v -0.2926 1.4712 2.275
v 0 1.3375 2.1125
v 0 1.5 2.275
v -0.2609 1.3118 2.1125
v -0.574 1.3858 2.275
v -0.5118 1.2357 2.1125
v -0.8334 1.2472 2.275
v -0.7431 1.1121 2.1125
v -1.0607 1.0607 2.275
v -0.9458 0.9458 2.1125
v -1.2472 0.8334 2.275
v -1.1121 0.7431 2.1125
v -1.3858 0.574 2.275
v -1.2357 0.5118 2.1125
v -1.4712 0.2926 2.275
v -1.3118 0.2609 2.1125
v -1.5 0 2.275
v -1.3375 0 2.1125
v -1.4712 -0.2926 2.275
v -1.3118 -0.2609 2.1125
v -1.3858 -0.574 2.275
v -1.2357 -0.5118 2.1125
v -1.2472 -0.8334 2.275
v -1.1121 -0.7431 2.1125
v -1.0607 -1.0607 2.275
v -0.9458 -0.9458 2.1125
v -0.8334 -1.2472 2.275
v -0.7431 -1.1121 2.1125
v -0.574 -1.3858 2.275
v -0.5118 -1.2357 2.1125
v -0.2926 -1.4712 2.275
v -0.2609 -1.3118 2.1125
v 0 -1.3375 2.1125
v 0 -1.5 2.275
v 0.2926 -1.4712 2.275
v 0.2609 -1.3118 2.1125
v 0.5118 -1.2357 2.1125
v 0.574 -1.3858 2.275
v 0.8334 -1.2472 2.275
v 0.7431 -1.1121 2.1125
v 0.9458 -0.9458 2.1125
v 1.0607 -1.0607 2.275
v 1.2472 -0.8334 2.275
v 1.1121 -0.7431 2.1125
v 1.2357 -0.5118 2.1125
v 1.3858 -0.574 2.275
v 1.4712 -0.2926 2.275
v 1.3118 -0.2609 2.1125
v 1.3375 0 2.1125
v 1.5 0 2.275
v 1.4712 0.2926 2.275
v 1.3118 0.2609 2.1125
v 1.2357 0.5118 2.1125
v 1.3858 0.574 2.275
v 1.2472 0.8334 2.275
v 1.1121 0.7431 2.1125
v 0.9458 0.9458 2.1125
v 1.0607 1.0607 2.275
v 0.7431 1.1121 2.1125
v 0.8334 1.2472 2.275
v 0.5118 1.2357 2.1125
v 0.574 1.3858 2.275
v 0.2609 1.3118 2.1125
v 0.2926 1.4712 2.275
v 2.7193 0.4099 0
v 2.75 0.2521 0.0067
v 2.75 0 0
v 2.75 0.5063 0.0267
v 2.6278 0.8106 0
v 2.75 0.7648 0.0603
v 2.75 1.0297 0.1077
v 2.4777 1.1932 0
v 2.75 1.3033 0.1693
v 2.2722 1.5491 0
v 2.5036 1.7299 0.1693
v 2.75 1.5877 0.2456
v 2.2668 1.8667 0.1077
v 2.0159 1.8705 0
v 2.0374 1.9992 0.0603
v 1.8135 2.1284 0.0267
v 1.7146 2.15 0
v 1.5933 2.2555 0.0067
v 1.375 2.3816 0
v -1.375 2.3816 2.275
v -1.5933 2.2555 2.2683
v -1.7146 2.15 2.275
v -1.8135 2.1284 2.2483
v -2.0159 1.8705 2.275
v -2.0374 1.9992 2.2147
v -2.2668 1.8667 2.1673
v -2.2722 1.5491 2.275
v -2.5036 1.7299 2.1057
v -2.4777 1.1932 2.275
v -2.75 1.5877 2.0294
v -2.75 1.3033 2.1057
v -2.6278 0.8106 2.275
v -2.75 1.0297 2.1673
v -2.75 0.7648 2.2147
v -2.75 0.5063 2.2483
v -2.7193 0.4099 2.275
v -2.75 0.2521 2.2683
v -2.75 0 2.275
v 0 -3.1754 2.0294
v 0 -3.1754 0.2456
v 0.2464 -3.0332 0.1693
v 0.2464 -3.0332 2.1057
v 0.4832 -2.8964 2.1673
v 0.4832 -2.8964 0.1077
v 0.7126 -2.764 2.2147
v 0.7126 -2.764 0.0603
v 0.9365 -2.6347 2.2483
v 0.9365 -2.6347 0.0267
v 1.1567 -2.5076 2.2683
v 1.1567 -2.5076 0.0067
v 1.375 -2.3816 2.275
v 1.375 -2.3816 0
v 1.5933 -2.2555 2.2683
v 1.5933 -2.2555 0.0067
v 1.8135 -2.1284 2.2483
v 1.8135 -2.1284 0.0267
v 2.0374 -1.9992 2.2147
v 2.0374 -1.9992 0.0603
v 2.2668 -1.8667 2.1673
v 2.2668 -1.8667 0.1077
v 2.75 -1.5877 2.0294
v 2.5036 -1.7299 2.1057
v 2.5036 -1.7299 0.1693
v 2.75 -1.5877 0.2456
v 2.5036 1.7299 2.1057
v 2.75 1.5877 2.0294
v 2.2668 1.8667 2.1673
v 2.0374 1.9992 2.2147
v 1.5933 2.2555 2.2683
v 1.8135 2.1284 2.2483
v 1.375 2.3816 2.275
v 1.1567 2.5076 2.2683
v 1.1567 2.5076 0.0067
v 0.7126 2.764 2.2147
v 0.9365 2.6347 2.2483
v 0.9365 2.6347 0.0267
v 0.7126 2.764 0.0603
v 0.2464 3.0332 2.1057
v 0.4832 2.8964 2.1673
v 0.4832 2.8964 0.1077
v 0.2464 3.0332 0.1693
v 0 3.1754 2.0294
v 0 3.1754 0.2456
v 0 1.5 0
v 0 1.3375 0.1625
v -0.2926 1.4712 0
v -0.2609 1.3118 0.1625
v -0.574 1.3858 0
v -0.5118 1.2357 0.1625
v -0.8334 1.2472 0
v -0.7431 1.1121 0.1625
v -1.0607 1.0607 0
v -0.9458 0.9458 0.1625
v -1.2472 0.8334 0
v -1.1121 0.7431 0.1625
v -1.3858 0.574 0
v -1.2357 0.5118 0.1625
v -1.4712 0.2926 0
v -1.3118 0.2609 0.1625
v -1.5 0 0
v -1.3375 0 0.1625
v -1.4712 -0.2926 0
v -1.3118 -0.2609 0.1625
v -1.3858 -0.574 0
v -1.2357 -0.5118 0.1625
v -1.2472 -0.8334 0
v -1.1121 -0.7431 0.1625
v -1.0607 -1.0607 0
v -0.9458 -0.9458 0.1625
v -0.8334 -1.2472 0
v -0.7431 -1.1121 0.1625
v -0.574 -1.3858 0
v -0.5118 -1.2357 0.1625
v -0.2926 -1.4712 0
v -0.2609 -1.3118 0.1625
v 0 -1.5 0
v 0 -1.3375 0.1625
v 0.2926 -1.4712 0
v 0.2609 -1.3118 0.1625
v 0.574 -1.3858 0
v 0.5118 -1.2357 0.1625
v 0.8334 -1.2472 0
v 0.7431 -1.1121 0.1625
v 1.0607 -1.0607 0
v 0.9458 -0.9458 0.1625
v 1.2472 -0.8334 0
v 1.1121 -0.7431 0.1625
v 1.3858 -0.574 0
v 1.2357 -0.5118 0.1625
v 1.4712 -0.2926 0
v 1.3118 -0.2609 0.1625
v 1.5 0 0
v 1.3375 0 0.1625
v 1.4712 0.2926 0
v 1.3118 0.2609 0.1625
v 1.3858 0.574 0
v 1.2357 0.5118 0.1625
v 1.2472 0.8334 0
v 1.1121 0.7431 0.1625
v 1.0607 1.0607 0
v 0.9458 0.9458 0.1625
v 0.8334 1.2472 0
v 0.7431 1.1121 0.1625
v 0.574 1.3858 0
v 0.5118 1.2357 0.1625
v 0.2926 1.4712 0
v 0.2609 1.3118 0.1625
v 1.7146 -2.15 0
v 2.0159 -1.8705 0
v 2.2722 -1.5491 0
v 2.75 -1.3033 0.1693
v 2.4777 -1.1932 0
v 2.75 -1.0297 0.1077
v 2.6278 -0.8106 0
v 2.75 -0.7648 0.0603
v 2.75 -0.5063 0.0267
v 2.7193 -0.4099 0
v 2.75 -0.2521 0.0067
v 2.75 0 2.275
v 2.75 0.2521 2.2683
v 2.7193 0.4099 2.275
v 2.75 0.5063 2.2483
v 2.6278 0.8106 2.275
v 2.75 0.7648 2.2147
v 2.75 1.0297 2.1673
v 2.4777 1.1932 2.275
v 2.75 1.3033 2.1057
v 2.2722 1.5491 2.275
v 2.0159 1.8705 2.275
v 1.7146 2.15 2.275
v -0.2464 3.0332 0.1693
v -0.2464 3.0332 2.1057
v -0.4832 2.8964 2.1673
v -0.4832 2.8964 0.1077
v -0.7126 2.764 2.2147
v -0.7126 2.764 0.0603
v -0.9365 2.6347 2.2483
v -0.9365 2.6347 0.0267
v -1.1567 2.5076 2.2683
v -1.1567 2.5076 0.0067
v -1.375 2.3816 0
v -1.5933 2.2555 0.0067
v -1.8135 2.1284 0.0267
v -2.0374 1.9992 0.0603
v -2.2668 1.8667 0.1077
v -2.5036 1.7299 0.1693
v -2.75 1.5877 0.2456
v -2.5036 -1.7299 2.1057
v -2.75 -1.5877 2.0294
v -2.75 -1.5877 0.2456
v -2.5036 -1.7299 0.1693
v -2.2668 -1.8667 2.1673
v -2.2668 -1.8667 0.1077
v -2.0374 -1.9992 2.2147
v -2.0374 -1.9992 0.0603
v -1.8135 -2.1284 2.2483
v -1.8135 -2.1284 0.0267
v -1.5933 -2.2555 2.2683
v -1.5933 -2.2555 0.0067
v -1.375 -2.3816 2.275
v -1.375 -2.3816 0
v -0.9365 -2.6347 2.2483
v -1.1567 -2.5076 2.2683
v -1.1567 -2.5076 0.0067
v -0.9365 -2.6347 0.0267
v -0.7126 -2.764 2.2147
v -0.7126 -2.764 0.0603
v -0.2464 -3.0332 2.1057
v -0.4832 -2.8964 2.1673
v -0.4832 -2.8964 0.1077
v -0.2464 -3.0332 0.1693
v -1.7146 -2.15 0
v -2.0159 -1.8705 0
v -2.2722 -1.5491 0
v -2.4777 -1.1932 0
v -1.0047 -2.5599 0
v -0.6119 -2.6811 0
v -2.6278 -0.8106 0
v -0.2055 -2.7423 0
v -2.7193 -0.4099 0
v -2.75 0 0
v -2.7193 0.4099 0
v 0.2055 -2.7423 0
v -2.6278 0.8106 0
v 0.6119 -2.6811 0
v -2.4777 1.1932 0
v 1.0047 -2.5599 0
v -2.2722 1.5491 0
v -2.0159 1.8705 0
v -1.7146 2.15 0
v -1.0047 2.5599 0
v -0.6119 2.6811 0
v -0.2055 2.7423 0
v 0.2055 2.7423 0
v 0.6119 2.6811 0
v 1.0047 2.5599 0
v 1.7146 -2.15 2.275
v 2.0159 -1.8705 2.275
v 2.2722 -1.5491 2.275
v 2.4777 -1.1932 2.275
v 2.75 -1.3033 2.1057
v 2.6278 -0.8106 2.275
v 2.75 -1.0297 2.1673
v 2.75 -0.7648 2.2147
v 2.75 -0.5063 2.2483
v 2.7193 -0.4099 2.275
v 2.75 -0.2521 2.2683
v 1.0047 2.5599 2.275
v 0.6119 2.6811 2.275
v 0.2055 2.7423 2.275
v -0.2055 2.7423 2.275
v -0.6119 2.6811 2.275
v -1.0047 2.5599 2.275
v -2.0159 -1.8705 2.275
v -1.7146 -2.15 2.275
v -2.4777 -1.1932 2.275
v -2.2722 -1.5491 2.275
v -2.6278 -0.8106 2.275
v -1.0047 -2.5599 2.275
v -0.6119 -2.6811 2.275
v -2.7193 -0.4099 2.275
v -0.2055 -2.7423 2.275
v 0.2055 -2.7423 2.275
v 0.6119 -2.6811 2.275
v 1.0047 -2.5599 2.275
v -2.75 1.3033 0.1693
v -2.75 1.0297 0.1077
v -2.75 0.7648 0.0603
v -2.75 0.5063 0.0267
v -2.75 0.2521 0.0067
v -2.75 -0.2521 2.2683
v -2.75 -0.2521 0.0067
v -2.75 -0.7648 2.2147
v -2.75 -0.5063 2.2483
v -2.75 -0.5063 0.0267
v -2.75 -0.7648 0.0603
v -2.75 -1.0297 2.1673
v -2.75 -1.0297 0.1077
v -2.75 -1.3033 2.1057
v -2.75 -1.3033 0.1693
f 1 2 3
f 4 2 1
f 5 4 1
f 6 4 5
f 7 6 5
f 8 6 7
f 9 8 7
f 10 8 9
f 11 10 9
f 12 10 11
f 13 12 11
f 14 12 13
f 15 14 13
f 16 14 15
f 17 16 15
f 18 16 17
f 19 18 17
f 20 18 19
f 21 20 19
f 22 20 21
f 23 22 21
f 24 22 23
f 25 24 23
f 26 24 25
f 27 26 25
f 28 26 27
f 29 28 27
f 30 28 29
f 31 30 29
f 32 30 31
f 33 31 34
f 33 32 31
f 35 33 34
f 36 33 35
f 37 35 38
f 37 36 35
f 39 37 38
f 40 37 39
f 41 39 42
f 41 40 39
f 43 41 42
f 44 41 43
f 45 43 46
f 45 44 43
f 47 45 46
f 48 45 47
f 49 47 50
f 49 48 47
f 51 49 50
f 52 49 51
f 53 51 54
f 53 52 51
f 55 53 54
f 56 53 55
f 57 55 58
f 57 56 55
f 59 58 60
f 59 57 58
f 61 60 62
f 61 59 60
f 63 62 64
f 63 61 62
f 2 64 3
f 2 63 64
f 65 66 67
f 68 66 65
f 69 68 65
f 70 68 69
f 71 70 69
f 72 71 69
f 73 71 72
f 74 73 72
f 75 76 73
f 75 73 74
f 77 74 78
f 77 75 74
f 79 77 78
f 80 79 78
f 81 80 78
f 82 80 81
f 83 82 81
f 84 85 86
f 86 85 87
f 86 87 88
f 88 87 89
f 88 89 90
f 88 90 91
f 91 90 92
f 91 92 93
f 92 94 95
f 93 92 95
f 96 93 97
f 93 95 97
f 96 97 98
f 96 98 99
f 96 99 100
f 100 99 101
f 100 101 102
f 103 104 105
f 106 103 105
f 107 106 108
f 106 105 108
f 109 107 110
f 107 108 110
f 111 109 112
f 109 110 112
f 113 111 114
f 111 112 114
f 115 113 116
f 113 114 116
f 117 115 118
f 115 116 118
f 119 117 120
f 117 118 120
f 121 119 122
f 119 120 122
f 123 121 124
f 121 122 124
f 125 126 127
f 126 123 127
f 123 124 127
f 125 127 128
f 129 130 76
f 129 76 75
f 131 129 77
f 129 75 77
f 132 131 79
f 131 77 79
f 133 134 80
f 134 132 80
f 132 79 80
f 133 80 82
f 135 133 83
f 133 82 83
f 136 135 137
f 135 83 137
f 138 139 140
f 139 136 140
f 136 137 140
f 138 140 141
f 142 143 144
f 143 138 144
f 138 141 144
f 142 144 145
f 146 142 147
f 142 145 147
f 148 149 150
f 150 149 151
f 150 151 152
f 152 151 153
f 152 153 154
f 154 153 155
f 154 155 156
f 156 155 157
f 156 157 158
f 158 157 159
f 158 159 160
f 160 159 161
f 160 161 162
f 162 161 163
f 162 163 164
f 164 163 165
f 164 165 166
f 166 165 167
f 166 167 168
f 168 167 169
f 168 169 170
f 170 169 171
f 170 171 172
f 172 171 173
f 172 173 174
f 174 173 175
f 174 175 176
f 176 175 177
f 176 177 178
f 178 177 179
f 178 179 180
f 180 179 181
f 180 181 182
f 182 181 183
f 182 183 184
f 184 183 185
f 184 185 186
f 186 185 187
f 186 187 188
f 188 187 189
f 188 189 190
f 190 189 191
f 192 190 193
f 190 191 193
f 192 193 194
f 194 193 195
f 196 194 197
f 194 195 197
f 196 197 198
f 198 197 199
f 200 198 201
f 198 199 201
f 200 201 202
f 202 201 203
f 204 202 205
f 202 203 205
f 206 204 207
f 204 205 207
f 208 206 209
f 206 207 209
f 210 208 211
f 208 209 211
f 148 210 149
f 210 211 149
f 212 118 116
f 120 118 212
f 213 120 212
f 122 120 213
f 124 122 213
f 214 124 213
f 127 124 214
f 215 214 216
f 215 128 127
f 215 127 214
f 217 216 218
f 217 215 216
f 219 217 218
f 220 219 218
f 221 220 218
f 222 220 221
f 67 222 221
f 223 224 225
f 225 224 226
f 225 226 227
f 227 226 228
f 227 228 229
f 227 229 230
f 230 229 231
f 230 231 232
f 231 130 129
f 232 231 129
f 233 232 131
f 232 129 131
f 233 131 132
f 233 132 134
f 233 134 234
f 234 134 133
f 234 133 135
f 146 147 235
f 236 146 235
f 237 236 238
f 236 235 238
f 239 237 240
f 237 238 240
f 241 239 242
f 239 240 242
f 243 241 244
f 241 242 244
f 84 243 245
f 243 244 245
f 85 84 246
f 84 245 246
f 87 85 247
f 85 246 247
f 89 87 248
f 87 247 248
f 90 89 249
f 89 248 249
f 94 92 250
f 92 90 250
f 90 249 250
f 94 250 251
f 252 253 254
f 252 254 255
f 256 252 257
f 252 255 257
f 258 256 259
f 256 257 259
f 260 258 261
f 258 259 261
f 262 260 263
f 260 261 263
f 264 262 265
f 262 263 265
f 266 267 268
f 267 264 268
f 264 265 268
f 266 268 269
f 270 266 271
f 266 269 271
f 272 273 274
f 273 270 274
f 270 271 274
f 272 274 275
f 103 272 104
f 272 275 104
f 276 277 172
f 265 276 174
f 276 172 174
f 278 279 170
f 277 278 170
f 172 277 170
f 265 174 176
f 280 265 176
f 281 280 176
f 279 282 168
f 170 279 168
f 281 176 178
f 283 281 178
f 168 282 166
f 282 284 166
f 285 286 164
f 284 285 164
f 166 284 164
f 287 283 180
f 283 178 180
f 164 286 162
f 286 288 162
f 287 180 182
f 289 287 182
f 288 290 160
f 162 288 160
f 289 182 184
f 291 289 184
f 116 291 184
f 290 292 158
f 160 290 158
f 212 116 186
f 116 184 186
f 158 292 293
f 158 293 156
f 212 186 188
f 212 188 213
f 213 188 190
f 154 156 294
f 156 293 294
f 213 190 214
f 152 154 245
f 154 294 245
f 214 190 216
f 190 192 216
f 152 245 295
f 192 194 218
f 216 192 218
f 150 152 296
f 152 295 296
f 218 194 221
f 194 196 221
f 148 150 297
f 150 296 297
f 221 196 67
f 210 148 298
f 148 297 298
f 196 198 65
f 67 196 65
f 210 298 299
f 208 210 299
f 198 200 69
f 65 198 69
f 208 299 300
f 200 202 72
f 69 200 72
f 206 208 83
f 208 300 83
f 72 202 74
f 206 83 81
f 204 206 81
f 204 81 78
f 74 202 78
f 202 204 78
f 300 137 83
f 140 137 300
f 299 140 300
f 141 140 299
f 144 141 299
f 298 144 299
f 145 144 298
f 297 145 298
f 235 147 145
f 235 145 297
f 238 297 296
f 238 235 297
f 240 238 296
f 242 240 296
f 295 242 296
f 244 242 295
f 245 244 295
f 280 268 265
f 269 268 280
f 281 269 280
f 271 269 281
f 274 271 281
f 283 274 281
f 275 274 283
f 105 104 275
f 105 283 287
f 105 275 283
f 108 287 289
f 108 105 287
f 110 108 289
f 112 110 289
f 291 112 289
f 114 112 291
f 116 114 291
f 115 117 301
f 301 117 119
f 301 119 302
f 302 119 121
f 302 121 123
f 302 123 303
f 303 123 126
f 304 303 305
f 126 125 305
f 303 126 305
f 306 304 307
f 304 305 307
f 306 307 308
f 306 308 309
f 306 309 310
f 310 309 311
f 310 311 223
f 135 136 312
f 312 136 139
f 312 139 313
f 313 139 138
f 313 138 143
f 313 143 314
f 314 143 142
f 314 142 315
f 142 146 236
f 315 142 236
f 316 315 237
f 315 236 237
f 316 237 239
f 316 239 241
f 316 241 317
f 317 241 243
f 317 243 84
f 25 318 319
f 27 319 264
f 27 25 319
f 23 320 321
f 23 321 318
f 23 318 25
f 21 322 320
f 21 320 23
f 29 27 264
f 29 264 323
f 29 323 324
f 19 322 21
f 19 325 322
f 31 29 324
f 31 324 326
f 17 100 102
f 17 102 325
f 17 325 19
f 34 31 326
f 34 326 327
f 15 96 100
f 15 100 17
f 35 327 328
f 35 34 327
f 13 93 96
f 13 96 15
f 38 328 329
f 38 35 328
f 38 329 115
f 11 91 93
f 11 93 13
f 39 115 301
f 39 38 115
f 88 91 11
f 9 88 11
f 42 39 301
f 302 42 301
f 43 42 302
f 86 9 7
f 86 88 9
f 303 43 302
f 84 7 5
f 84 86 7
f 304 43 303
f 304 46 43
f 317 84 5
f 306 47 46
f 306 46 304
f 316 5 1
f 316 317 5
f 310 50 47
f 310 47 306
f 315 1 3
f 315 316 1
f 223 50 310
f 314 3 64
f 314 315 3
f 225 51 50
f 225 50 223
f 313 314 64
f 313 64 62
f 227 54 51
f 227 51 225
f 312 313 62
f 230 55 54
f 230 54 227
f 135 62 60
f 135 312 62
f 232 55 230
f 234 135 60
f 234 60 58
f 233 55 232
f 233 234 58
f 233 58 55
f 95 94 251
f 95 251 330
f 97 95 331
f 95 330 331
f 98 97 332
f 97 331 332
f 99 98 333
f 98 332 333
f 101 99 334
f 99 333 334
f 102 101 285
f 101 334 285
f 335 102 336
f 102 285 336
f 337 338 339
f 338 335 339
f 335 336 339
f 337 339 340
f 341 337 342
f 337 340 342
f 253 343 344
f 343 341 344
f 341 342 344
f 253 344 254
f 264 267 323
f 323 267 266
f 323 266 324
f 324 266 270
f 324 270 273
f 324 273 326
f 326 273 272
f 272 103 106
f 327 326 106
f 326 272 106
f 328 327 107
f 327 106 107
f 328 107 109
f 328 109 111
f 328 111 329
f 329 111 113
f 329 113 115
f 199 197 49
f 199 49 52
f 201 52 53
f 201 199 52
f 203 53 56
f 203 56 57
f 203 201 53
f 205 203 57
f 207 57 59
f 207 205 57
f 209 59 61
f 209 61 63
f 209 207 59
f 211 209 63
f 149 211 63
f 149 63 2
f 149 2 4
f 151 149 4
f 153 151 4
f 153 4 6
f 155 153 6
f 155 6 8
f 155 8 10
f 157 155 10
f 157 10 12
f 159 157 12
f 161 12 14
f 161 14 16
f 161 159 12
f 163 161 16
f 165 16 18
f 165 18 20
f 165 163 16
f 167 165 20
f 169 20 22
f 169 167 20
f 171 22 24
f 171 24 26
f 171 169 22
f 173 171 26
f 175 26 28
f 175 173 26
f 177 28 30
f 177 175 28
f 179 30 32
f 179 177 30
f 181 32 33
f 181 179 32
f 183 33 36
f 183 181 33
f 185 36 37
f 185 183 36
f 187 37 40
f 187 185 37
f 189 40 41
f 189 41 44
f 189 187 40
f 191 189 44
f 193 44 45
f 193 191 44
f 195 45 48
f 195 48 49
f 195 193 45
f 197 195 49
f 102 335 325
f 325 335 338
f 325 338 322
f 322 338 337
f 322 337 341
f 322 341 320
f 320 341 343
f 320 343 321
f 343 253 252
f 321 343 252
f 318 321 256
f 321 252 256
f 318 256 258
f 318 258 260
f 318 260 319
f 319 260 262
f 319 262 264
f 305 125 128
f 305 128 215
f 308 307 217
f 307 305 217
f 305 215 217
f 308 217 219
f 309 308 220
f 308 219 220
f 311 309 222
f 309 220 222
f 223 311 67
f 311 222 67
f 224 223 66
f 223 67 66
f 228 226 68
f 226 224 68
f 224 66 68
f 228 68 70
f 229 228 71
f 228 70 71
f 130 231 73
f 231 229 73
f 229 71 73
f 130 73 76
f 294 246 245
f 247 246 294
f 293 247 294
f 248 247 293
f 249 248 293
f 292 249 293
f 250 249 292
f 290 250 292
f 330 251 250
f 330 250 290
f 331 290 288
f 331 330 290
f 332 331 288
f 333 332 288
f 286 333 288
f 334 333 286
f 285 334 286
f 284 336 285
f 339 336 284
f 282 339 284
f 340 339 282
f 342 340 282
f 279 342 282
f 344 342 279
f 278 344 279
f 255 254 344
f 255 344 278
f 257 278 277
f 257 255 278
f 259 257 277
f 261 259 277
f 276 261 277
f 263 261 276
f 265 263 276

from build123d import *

# Parameters (mm, degrees)
SKETCH1_R           = 1.3375
BOSS_EXTRUDE1_DEPTH = 2.275


with BuildPart() as part:
    # Sketch1 → Boss-Extrude1 (new body)
    with BuildSketch(Plane.XY):
        Polygon((0, 3.175426481), (-2.75, 1.58771324), (-2.75, -1.58771324), (0, -3.175426481), (2.75, -1.58771324), (2.75, 1.58771324), align=None)
        Circle(SKETCH1_R, mode=Mode.SUBTRACT)
    extrude(amount=BOSS_EXTRUDE1_DEPTH)

    # Sketch2 → Cut-Revolve1 (revolve, cut)
    with BuildSketch(Plane(origin=(0, 0, 0), x_dir=(0, 0, -1), z_dir=(1, 0, 0))):
        Polygon((-2.275, 1.3375), (-2.275, 1.5), (-2.1125, 1.3375), align=None)
        Polygon((-2.275, 3.175426481), (-2.275, 2.75), (-2.029379907, 3.175426481), align=None)
        Polygon((-0.245620093, 3.175426481), (0, 3.175426481), (0, 2.75), align=None)
        Polygon((-0.1625, 1.3375), (0, 1.3375), (0, 1.5), align=None)
    revolve(axis=Axis((0, 0, 0), (0, 0, 1)), mode=Mode.SUBTRACT)


solid = part.part
